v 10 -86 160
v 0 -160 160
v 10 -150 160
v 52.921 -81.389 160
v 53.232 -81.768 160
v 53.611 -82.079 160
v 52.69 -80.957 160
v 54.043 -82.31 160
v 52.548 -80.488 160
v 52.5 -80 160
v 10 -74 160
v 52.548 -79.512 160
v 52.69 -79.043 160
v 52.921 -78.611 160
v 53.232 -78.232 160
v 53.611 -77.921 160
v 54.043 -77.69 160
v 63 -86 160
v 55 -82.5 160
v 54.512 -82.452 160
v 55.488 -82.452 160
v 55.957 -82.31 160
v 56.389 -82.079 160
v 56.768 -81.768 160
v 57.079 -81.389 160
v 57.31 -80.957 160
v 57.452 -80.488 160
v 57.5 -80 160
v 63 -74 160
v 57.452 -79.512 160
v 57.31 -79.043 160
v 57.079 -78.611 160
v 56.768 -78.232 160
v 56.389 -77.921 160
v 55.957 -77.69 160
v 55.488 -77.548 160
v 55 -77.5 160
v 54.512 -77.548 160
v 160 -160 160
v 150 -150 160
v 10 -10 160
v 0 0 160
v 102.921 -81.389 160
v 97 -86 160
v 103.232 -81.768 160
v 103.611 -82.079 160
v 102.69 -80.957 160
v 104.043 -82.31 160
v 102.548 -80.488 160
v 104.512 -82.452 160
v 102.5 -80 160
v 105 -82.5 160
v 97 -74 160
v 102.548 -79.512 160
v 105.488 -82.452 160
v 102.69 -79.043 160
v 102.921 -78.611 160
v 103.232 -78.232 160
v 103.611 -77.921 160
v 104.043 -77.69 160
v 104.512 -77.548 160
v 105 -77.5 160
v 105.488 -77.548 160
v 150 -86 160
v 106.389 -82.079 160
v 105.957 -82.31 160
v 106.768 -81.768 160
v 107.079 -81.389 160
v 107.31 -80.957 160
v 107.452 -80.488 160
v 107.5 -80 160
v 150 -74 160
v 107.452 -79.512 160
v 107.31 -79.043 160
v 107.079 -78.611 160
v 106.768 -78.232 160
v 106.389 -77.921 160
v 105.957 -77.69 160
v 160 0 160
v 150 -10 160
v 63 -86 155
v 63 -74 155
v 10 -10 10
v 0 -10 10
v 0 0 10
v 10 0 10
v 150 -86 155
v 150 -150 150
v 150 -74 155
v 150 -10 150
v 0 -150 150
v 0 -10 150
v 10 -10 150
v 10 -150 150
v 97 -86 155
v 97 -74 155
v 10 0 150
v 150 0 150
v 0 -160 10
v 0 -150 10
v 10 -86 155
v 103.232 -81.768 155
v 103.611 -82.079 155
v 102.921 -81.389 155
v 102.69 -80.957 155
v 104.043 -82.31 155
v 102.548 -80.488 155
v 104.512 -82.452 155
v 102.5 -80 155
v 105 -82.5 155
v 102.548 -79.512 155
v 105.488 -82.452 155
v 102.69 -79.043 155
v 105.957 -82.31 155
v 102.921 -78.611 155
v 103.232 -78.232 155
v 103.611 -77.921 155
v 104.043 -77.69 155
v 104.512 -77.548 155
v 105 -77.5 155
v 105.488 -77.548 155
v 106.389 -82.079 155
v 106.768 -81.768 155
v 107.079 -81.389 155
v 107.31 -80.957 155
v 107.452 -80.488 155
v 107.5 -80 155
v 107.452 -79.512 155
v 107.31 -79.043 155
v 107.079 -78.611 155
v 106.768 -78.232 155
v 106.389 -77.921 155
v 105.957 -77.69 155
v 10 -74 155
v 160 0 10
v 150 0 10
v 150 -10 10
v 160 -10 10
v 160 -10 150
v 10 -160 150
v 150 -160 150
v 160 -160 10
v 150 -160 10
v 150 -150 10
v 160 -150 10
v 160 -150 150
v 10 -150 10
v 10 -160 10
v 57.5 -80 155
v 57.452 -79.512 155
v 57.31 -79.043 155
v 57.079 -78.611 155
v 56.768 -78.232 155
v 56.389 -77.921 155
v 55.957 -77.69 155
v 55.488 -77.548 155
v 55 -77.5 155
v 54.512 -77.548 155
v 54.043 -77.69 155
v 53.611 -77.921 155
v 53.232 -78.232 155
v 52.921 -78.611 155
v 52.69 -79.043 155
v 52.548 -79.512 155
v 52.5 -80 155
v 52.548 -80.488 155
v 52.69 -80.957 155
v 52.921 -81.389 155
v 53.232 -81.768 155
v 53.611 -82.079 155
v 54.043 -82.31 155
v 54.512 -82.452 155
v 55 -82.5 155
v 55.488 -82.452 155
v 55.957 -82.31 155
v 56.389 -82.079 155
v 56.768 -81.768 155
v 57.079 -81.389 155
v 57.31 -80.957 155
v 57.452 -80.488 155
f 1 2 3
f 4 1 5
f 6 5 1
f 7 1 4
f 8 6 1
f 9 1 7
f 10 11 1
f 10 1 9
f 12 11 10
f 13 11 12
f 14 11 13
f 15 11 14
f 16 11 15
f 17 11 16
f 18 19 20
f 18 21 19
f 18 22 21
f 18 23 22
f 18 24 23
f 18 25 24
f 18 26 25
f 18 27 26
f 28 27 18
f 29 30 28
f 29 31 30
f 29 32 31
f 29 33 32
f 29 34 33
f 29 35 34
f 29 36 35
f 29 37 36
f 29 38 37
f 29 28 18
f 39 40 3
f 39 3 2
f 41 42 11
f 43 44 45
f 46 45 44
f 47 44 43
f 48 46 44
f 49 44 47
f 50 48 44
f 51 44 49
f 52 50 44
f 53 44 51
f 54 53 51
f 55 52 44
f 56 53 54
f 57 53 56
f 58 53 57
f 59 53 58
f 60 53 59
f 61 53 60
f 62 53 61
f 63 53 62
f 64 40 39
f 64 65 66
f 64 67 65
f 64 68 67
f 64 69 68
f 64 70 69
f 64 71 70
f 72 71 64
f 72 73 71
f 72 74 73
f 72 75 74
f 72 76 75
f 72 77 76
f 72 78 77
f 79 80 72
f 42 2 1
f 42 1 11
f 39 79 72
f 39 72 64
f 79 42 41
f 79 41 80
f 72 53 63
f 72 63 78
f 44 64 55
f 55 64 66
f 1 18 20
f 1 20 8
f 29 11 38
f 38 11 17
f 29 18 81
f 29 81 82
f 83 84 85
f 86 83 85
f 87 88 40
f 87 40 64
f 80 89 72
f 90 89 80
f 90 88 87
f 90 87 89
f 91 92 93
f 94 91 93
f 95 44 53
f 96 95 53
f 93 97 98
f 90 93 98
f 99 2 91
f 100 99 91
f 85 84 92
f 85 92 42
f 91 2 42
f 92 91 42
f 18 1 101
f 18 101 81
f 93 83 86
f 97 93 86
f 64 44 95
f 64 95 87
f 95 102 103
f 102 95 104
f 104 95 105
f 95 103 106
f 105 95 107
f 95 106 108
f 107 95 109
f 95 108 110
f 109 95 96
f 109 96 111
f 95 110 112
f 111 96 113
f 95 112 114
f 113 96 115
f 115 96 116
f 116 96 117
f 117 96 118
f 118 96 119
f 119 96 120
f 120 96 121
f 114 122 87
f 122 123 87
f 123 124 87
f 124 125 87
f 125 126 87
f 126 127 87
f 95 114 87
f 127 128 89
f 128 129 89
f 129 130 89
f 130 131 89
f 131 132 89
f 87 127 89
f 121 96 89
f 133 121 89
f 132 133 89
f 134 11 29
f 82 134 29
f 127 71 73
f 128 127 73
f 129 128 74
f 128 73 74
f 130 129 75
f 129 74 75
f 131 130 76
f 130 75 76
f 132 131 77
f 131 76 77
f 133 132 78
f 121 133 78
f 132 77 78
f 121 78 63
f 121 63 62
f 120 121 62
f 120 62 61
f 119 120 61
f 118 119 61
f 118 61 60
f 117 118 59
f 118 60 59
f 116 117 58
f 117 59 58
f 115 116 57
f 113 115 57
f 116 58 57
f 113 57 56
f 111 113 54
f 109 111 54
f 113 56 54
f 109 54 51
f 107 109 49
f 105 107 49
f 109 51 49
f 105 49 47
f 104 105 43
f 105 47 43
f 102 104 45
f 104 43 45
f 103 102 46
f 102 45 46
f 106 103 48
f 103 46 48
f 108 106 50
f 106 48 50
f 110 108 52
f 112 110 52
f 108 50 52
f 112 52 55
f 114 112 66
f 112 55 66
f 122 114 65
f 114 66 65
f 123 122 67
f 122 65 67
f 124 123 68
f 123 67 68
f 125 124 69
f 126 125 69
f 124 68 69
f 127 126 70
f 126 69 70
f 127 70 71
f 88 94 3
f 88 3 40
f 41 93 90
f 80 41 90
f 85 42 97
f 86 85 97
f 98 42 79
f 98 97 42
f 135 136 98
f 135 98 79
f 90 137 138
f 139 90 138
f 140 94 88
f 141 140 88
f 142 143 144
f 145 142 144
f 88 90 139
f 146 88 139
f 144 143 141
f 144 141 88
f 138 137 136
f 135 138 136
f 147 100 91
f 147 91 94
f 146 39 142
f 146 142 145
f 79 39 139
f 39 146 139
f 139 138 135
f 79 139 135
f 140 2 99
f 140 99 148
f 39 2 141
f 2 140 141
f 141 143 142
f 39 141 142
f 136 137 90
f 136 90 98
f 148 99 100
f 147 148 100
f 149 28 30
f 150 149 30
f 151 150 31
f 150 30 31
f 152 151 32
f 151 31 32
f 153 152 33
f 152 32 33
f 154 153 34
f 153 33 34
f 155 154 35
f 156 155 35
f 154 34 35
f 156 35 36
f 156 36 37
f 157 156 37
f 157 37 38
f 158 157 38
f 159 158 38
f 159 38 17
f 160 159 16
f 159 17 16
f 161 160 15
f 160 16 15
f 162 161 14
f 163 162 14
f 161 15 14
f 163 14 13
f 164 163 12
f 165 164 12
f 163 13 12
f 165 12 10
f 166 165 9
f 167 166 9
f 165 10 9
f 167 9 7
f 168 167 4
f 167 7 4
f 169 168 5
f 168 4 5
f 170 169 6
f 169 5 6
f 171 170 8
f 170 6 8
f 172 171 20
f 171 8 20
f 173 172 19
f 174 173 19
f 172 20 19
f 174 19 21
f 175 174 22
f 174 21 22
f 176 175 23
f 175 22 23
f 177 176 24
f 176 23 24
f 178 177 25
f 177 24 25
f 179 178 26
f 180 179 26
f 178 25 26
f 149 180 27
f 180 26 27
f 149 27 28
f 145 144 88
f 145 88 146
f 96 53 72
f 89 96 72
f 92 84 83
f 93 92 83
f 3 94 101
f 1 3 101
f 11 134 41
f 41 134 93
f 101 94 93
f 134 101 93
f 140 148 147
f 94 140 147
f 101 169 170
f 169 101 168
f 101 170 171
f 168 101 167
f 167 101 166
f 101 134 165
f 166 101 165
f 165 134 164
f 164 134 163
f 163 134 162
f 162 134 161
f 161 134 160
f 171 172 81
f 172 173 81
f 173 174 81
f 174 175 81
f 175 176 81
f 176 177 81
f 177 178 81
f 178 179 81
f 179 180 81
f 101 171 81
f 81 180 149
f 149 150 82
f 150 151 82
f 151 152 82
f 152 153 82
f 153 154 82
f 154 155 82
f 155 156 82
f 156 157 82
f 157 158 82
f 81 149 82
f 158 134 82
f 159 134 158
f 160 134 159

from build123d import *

# Parameters (mm, degrees)
CROQUIS2_W                   = 160
CROQUIS2_H                   = 160
CROQUIS2_W_2                 = 140
CROQUIS2_H_2                 = 140
SALIENTE_EXTRUIR1_DEPTH      = 10
CROQUIS3_W                   = 152
CROQUIS3_H                   = 152
CROQUIS3_W_2                 = 148
CROQUIS3_H_2                 = 148
CORTAR_EXTRUIR1_DEPTH        = 3.5
SALIENTE_EXTRUIR2_DEPTH      = 140
SALIENTE_EXTRUIR2_DEPTH_BACK = 10
CROQUIS4_W                   = 10
CROQUIS4_H                   = 10
CROQUIS7_W                   = 160
CROQUIS7_H                   = 160
CROQUIS7_W_2                 = 140
CROQUIS7_H_2                 = 140
SALIENTE_EXTRUIR3_DEPTH      = 10
CROQUIS8_W                   = 63
CROQUIS8_H                   = 12
CROQUIS8_R                   = 2.5
SALIENTE_EXTRUIR4_DEPTH      = 5
CROQUIS9_W                   = 10
CROQUIS9_H                   = 160
CORTAR_EXTRUIR2_DEPTH        = 278.128129211


with BuildPart() as part:
    # Croquis2 → Saliente-Extruir1 (new body)
    with BuildSketch(Plane.XY):
        with Locations((80, -80)):
            Rectangle(CROQUIS2_W, CROQUIS2_H)
        with Locations((80, -80)):
            Rectangle(CROQUIS2_W_2, CROQUIS2_H_2, mode=Mode.SUBTRACT)
    extrude(amount=SALIENTE_EXTRUIR1_DEPTH)

    # Croquis3 → Cortar-Extruir1 (cut)
    with BuildSketch(Plane.XY.offset(10)):
        with Locations((80, -80)):
            Rectangle(CROQUIS3_W, CROQUIS3_H)
        with Locations((80, -80)):
            Rectangle(CROQUIS3_W_2, CROQUIS3_H_2, mode=Mode.SUBTRACT)
    extrude(amount=-CORTAR_EXTRUIR1_DEPTH, mode=Mode.SUBTRACT)

    # Croquis4 → Saliente-Extruir2 (add, two sides: drawn at the far end of the back side and taken through both)
    with BuildSketch(Plane.XY.offset(10).offset(-SALIENTE_EXTRUIR2_DEPTH_BACK)):
        with Locations((5, -5)):
            Rectangle(CROQUIS4_W, CROQUIS4_H)
        with Locations((155, -5)):
            Rectangle(CROQUIS4_W, CROQUIS4_H)
        with Locations((155, -155)):
            Rectangle(CROQUIS4_W, CROQUIS4_H)
        with Locations((5, -155)):
            Rectangle(CROQUIS4_W, CROQUIS4_H)
    extrude(amount=SALIENTE_EXTRUIR2_DEPTH + SALIENTE_EXTRUIR2_DEPTH_BACK)

    # Croquis7 → Saliente-Extruir3 (add)
    with BuildSketch(Plane.XY.offset(150)):
        with Locations((80, -80)):
            Rectangle(CROQUIS7_W, CROQUIS7_H)
        with Locations((80, -80)):
            Rectangle(CROQUIS7_W_2, CROQUIS7_H_2, mode=Mode.SUBTRACT)
    extrude(amount=SALIENTE_EXTRUIR3_DEPTH)

    # Croquis8 → Saliente-Extruir4 (add)
    # profile 1 of 2: a face of its own
    with BuildSketch(Plane.XY.offset(160)):
        with Locations((31.5, -80)):
            Rectangle(CROQUIS8_W, CROQUIS8_H)
        with Locations((55, -80)):
            Circle(CROQUIS8_R, mode=Mode.SUBTRACT)
    # profile 2 of 2: a face of its own
    with BuildSketch(Plane.XY.offset(160)):
        with Locations((128.5, -80)):
            Rectangle(CROQUIS8_W, CROQUIS8_H)
        with Locations((105, -80)):
            Circle(CROQUIS8_R, mode=Mode.SUBTRACT)
    extrude(amount=-SALIENTE_EXTRUIR4_DEPTH)

    # Croquis9 → Cortar-Extruir2 (cut, through all)
    with BuildSketch(Plane.ZY):
        with Locations((5, -80)):
            Rectangle(CROQUIS9_W, CROQUIS9_H)
    extrude(amount=-CORTAR_EXTRUIR2_DEPTH, mode=Mode.SUBTRACT)


solid = part.part
